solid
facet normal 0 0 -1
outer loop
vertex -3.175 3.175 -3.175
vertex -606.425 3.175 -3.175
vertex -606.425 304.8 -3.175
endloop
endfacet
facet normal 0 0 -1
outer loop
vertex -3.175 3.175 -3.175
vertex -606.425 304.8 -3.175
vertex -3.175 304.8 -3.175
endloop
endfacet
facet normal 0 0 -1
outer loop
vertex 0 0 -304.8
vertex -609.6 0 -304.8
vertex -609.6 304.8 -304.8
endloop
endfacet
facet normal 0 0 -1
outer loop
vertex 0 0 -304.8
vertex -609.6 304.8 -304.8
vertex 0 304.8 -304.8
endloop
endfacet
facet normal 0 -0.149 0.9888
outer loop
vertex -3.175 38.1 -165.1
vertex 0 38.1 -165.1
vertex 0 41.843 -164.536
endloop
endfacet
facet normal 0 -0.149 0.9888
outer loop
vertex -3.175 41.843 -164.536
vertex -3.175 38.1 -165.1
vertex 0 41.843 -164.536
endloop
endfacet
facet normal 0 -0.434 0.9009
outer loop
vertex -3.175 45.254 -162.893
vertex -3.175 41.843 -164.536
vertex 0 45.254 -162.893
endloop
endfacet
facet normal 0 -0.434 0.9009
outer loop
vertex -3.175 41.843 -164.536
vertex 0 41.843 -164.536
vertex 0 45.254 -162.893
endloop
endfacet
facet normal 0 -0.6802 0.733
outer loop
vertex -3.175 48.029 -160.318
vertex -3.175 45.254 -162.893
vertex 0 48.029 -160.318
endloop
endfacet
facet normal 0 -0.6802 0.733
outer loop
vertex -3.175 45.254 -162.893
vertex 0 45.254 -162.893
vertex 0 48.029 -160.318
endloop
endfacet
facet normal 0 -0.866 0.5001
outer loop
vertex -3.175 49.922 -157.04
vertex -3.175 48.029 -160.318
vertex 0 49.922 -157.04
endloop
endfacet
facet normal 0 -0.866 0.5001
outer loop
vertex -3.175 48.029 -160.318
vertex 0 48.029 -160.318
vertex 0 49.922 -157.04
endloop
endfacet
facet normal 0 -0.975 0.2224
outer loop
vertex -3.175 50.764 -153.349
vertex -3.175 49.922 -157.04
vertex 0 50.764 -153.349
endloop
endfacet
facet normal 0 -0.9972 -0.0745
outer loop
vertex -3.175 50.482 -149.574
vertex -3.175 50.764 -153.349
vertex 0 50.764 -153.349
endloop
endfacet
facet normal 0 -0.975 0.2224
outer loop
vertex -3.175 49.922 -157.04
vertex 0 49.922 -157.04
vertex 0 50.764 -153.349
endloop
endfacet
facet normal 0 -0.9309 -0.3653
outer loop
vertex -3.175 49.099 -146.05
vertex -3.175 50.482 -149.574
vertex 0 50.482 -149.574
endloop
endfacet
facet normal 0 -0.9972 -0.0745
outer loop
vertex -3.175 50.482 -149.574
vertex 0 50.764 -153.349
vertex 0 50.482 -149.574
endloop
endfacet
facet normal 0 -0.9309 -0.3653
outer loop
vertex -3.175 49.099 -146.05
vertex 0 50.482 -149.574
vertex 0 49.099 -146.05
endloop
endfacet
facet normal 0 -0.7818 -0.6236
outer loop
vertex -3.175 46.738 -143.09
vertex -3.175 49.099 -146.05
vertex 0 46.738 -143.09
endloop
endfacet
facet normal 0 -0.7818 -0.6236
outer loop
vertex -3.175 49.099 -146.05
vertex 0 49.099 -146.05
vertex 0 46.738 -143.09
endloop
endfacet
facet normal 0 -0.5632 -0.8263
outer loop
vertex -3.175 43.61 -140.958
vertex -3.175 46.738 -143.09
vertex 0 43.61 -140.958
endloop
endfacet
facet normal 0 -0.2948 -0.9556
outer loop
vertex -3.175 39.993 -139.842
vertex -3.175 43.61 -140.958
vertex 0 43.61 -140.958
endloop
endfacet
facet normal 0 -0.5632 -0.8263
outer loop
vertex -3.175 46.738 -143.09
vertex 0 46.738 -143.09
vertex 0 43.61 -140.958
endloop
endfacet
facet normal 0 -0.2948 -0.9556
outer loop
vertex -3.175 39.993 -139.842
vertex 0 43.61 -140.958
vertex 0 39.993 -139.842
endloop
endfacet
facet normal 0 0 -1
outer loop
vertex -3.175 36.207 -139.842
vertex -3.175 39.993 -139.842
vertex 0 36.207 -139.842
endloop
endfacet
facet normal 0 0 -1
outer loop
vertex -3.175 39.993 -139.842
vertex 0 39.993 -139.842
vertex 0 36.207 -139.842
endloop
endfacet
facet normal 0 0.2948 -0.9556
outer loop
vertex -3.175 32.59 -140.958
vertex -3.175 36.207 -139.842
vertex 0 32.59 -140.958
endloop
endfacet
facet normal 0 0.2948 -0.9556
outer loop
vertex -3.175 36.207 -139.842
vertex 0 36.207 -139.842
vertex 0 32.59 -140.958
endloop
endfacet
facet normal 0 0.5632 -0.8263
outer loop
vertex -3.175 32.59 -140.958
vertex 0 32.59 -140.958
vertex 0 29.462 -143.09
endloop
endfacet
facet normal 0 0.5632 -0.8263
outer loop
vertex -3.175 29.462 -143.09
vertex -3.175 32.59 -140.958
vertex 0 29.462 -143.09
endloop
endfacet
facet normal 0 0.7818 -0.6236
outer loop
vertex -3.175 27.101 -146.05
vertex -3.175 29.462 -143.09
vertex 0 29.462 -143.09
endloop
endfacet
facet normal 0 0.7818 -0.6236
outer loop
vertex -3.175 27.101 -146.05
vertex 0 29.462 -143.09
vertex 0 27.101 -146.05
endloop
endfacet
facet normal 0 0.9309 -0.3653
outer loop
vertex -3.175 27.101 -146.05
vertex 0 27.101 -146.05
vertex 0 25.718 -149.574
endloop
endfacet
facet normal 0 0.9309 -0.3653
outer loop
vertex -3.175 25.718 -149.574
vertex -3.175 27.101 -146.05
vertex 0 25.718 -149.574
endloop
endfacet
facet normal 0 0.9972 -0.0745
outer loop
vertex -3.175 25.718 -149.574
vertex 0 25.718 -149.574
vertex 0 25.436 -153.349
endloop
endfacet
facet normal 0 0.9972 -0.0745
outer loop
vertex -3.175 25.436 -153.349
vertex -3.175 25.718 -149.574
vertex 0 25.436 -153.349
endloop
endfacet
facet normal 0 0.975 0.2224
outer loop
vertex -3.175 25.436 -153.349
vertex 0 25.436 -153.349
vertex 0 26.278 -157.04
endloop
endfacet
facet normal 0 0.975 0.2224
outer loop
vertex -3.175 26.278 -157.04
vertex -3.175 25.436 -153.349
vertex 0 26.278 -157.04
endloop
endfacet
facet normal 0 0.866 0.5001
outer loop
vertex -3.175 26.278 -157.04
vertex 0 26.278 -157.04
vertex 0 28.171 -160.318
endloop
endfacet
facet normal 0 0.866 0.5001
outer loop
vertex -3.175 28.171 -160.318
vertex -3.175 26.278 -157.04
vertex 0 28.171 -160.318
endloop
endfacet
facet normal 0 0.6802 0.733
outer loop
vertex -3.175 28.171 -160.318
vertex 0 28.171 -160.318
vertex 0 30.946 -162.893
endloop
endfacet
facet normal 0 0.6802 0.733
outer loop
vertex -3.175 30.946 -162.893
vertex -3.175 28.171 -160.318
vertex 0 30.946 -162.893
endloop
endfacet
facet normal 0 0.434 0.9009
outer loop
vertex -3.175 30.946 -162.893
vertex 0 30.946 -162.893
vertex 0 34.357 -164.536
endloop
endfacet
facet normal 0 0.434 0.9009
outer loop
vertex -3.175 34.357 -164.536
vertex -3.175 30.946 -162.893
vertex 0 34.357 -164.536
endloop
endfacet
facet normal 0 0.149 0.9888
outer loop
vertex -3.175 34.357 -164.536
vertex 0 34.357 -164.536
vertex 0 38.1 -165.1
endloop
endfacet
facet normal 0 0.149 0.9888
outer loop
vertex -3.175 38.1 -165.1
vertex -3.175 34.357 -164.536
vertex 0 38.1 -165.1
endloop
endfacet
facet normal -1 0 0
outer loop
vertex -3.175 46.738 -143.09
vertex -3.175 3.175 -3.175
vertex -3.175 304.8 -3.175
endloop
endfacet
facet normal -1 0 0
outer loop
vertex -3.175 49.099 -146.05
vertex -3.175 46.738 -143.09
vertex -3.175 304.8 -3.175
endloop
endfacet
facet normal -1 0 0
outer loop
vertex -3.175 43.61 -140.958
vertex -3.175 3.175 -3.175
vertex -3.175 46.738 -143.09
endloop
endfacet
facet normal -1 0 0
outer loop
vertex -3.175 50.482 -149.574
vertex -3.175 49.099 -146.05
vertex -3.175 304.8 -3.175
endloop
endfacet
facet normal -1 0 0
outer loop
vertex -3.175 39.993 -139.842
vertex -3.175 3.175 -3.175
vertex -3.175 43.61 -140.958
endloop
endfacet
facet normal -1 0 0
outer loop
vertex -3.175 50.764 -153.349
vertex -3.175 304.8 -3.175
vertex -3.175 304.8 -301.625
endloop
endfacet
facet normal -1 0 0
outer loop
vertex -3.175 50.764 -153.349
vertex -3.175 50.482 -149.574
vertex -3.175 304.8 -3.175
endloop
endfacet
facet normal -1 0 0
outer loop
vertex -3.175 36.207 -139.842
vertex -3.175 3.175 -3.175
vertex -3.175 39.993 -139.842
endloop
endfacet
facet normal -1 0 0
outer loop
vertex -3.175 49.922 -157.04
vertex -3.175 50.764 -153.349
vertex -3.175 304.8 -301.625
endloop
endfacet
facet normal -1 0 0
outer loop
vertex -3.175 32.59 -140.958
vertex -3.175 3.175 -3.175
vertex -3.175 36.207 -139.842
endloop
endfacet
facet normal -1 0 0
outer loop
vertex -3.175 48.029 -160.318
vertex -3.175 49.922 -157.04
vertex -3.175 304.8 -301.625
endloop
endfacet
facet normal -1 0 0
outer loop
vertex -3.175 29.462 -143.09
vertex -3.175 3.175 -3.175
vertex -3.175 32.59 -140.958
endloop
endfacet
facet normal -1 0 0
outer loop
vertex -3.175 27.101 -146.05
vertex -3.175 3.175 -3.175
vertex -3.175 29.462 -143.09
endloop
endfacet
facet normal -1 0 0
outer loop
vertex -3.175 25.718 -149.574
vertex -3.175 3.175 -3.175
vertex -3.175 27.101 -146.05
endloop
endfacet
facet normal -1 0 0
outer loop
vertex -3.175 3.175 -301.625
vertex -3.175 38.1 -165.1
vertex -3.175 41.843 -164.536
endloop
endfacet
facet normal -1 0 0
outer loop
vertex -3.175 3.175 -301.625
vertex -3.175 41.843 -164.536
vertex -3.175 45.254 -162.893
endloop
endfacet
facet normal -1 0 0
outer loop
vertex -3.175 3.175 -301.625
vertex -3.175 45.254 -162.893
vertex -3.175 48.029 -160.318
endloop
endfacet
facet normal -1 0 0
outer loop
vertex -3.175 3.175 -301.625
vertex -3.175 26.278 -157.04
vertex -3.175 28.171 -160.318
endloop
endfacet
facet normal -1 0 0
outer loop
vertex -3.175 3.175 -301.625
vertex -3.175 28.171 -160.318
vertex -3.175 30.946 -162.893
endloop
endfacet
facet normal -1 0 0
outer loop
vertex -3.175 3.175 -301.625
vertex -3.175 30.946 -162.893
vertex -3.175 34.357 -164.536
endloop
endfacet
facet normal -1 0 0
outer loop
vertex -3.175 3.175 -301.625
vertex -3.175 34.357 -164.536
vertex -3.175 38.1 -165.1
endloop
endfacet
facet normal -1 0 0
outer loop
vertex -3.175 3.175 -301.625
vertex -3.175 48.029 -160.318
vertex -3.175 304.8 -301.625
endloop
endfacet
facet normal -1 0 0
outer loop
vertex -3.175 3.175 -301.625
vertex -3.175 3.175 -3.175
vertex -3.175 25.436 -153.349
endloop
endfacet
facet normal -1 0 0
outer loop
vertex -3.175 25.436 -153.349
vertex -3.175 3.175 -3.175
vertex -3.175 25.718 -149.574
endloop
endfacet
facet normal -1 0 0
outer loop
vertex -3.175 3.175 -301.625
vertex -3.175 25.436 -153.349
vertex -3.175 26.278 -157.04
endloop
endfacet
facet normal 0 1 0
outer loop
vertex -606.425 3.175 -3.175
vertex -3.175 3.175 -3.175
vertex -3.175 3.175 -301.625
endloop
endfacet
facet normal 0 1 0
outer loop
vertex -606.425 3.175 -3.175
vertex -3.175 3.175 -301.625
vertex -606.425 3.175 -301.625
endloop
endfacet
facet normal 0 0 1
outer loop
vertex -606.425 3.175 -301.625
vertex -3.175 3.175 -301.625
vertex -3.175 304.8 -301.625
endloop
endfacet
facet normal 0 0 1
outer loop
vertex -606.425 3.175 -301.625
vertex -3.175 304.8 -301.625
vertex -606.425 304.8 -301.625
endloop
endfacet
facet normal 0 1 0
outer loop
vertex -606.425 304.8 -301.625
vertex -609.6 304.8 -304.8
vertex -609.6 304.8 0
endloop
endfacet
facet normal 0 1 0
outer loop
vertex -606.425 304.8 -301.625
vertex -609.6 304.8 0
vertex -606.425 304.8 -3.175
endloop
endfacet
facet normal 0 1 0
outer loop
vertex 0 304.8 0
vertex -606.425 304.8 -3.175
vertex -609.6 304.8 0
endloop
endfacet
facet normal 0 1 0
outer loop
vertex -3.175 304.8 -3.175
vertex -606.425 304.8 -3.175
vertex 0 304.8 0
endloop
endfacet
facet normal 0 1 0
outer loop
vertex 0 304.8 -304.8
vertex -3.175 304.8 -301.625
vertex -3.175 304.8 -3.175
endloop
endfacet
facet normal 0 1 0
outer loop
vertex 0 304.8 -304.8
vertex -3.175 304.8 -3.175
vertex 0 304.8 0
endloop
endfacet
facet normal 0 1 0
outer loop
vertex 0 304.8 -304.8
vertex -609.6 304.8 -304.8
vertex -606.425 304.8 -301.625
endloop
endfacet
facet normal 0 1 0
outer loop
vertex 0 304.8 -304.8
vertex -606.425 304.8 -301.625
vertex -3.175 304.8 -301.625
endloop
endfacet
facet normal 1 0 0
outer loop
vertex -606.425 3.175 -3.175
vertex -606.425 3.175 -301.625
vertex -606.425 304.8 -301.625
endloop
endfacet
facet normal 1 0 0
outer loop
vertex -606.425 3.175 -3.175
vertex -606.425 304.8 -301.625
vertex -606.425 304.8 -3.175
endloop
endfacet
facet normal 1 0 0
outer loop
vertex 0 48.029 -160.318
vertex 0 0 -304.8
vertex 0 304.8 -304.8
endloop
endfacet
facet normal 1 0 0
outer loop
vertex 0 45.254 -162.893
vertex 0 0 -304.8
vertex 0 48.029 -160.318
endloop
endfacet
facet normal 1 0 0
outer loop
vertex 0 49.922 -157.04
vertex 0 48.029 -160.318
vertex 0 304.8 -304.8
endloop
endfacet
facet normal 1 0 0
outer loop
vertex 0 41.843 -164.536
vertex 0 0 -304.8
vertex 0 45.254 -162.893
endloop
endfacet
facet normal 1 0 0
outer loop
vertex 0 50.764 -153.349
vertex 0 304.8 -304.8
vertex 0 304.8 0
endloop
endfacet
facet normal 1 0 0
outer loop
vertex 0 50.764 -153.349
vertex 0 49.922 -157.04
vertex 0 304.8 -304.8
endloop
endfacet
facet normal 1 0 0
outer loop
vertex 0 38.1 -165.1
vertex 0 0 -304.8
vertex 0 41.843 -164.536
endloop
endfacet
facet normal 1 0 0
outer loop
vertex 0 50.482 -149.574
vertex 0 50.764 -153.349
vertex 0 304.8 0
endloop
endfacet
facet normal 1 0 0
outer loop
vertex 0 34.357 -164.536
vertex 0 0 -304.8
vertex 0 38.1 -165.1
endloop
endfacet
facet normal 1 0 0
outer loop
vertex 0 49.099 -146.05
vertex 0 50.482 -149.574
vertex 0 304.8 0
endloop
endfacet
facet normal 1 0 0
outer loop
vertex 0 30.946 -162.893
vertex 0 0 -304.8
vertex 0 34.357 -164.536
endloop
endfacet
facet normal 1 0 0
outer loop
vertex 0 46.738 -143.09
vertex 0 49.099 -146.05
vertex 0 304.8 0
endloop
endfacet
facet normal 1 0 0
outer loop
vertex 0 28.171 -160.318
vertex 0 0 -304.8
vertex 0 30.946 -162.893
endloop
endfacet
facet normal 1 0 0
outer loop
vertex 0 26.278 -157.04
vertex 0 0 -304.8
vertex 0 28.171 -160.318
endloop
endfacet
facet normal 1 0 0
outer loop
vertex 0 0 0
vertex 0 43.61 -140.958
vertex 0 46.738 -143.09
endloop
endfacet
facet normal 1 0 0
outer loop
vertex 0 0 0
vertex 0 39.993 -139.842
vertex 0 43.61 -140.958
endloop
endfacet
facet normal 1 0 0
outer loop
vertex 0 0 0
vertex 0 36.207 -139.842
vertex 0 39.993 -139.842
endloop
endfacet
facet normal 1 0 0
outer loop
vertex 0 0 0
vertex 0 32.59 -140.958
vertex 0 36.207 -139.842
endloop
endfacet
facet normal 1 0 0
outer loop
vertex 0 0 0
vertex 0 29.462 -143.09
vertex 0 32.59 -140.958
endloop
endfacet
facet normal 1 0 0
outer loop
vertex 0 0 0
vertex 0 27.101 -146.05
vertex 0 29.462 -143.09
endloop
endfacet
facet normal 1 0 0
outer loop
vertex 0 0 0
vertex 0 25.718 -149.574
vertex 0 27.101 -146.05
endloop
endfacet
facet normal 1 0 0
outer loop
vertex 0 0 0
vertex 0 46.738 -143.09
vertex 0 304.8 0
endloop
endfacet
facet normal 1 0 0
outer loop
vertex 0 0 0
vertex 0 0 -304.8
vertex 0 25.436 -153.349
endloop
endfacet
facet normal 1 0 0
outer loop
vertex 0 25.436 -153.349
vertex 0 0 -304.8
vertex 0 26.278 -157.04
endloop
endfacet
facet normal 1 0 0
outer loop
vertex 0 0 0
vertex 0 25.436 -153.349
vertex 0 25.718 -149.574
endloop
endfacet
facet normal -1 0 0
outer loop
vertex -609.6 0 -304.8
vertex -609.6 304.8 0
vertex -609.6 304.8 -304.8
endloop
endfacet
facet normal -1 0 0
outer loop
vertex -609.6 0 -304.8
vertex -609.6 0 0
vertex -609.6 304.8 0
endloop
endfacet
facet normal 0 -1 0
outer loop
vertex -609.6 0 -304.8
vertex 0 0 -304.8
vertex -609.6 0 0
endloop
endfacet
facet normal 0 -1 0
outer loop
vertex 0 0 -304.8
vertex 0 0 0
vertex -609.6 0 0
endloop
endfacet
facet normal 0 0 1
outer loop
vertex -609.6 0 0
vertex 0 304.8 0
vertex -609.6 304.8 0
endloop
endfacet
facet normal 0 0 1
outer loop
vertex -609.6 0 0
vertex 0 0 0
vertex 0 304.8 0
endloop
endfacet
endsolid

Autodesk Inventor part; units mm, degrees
ref_plane "YZ Plane" through (0, 0, 0) normal (1, 0, 0) x (0, 1, 0)
ref_plane "XZ Plane" through (0, 0, 0) normal (0, 1, 0) x (-1, 0, 0)
ref_plane "XY Plane" through (0, 0, 0) normal (0, 0, 1) x (1, 0, 0)
sketch "Sketch1" plane through (0, 0, 0) normal (0, 1, 0) x (-1, 0, 0)
  line L0 (0, 0) -> (609.6, 0)
  line L1 (609.6, 0) -> (609.6, -304.8)
  line L2 (609.6, -304.8) -> (0, -304.8)
  line L3 (0, -304.8) -> (0, 0)
  dimension "d0" = 304.8
  dimension "d1" = 609.6
extrude "Extrusion1" add sketch "Sketch1" along normal blind 3.175
sketch "Sketch2" plane through (0, 3.175, 0) normal (0, 1, 0) x (1, 0, 0)
  line L0 (-609.6, 0) -> (0, 0) projected
  line L1 (0, 0) -> (0, 304.8) projected
  line L2 (-609.6, 0) -> (0, 0)
  line L3 (0, 0) -> (0, 304.8)
  line L4 (0, 304.8) -> (-609.6, 304.8)
  line L5 (-609.6, 304.8) -> (-609.6, 0)
  line L6 (-606.425, 3.175) -> (-3.175, 3.175)
  line L7 (-3.175, 3.175) -> (-3.175, 301.625)
  line L8 (-3.175, 301.625) -> (-606.425, 301.625)
  line L9 (-606.425, 301.625) -> (-606.425, 3.175)
  dimension "d4" = 3.175
  dimension "d5" = 3.175
  dimension "d6" = 3.175
  dimension "d7" = 3.175
extrude "Extrusion2" add sketch "Sketch2" along normal blind 301.625
sketch "Sketch5" plane through (0, 0, 0) normal (1, 0, 0) x (0, 0, -1)
  circle A0 centre (152.4, 38.1) radius 12.7
  line L0 (304.8, 0) -> (0, 0) projected
  line L1 (304.8, 0) -> (304.8, 304.8) projected
  dimension "d18" = 25.4
  dimension "d19" = 38.1
  dimension "d20" = 152.4
extrude "Extrusion5" cut sketch "Sketch5" against normal blind 25.4
properties part number "Burner"
